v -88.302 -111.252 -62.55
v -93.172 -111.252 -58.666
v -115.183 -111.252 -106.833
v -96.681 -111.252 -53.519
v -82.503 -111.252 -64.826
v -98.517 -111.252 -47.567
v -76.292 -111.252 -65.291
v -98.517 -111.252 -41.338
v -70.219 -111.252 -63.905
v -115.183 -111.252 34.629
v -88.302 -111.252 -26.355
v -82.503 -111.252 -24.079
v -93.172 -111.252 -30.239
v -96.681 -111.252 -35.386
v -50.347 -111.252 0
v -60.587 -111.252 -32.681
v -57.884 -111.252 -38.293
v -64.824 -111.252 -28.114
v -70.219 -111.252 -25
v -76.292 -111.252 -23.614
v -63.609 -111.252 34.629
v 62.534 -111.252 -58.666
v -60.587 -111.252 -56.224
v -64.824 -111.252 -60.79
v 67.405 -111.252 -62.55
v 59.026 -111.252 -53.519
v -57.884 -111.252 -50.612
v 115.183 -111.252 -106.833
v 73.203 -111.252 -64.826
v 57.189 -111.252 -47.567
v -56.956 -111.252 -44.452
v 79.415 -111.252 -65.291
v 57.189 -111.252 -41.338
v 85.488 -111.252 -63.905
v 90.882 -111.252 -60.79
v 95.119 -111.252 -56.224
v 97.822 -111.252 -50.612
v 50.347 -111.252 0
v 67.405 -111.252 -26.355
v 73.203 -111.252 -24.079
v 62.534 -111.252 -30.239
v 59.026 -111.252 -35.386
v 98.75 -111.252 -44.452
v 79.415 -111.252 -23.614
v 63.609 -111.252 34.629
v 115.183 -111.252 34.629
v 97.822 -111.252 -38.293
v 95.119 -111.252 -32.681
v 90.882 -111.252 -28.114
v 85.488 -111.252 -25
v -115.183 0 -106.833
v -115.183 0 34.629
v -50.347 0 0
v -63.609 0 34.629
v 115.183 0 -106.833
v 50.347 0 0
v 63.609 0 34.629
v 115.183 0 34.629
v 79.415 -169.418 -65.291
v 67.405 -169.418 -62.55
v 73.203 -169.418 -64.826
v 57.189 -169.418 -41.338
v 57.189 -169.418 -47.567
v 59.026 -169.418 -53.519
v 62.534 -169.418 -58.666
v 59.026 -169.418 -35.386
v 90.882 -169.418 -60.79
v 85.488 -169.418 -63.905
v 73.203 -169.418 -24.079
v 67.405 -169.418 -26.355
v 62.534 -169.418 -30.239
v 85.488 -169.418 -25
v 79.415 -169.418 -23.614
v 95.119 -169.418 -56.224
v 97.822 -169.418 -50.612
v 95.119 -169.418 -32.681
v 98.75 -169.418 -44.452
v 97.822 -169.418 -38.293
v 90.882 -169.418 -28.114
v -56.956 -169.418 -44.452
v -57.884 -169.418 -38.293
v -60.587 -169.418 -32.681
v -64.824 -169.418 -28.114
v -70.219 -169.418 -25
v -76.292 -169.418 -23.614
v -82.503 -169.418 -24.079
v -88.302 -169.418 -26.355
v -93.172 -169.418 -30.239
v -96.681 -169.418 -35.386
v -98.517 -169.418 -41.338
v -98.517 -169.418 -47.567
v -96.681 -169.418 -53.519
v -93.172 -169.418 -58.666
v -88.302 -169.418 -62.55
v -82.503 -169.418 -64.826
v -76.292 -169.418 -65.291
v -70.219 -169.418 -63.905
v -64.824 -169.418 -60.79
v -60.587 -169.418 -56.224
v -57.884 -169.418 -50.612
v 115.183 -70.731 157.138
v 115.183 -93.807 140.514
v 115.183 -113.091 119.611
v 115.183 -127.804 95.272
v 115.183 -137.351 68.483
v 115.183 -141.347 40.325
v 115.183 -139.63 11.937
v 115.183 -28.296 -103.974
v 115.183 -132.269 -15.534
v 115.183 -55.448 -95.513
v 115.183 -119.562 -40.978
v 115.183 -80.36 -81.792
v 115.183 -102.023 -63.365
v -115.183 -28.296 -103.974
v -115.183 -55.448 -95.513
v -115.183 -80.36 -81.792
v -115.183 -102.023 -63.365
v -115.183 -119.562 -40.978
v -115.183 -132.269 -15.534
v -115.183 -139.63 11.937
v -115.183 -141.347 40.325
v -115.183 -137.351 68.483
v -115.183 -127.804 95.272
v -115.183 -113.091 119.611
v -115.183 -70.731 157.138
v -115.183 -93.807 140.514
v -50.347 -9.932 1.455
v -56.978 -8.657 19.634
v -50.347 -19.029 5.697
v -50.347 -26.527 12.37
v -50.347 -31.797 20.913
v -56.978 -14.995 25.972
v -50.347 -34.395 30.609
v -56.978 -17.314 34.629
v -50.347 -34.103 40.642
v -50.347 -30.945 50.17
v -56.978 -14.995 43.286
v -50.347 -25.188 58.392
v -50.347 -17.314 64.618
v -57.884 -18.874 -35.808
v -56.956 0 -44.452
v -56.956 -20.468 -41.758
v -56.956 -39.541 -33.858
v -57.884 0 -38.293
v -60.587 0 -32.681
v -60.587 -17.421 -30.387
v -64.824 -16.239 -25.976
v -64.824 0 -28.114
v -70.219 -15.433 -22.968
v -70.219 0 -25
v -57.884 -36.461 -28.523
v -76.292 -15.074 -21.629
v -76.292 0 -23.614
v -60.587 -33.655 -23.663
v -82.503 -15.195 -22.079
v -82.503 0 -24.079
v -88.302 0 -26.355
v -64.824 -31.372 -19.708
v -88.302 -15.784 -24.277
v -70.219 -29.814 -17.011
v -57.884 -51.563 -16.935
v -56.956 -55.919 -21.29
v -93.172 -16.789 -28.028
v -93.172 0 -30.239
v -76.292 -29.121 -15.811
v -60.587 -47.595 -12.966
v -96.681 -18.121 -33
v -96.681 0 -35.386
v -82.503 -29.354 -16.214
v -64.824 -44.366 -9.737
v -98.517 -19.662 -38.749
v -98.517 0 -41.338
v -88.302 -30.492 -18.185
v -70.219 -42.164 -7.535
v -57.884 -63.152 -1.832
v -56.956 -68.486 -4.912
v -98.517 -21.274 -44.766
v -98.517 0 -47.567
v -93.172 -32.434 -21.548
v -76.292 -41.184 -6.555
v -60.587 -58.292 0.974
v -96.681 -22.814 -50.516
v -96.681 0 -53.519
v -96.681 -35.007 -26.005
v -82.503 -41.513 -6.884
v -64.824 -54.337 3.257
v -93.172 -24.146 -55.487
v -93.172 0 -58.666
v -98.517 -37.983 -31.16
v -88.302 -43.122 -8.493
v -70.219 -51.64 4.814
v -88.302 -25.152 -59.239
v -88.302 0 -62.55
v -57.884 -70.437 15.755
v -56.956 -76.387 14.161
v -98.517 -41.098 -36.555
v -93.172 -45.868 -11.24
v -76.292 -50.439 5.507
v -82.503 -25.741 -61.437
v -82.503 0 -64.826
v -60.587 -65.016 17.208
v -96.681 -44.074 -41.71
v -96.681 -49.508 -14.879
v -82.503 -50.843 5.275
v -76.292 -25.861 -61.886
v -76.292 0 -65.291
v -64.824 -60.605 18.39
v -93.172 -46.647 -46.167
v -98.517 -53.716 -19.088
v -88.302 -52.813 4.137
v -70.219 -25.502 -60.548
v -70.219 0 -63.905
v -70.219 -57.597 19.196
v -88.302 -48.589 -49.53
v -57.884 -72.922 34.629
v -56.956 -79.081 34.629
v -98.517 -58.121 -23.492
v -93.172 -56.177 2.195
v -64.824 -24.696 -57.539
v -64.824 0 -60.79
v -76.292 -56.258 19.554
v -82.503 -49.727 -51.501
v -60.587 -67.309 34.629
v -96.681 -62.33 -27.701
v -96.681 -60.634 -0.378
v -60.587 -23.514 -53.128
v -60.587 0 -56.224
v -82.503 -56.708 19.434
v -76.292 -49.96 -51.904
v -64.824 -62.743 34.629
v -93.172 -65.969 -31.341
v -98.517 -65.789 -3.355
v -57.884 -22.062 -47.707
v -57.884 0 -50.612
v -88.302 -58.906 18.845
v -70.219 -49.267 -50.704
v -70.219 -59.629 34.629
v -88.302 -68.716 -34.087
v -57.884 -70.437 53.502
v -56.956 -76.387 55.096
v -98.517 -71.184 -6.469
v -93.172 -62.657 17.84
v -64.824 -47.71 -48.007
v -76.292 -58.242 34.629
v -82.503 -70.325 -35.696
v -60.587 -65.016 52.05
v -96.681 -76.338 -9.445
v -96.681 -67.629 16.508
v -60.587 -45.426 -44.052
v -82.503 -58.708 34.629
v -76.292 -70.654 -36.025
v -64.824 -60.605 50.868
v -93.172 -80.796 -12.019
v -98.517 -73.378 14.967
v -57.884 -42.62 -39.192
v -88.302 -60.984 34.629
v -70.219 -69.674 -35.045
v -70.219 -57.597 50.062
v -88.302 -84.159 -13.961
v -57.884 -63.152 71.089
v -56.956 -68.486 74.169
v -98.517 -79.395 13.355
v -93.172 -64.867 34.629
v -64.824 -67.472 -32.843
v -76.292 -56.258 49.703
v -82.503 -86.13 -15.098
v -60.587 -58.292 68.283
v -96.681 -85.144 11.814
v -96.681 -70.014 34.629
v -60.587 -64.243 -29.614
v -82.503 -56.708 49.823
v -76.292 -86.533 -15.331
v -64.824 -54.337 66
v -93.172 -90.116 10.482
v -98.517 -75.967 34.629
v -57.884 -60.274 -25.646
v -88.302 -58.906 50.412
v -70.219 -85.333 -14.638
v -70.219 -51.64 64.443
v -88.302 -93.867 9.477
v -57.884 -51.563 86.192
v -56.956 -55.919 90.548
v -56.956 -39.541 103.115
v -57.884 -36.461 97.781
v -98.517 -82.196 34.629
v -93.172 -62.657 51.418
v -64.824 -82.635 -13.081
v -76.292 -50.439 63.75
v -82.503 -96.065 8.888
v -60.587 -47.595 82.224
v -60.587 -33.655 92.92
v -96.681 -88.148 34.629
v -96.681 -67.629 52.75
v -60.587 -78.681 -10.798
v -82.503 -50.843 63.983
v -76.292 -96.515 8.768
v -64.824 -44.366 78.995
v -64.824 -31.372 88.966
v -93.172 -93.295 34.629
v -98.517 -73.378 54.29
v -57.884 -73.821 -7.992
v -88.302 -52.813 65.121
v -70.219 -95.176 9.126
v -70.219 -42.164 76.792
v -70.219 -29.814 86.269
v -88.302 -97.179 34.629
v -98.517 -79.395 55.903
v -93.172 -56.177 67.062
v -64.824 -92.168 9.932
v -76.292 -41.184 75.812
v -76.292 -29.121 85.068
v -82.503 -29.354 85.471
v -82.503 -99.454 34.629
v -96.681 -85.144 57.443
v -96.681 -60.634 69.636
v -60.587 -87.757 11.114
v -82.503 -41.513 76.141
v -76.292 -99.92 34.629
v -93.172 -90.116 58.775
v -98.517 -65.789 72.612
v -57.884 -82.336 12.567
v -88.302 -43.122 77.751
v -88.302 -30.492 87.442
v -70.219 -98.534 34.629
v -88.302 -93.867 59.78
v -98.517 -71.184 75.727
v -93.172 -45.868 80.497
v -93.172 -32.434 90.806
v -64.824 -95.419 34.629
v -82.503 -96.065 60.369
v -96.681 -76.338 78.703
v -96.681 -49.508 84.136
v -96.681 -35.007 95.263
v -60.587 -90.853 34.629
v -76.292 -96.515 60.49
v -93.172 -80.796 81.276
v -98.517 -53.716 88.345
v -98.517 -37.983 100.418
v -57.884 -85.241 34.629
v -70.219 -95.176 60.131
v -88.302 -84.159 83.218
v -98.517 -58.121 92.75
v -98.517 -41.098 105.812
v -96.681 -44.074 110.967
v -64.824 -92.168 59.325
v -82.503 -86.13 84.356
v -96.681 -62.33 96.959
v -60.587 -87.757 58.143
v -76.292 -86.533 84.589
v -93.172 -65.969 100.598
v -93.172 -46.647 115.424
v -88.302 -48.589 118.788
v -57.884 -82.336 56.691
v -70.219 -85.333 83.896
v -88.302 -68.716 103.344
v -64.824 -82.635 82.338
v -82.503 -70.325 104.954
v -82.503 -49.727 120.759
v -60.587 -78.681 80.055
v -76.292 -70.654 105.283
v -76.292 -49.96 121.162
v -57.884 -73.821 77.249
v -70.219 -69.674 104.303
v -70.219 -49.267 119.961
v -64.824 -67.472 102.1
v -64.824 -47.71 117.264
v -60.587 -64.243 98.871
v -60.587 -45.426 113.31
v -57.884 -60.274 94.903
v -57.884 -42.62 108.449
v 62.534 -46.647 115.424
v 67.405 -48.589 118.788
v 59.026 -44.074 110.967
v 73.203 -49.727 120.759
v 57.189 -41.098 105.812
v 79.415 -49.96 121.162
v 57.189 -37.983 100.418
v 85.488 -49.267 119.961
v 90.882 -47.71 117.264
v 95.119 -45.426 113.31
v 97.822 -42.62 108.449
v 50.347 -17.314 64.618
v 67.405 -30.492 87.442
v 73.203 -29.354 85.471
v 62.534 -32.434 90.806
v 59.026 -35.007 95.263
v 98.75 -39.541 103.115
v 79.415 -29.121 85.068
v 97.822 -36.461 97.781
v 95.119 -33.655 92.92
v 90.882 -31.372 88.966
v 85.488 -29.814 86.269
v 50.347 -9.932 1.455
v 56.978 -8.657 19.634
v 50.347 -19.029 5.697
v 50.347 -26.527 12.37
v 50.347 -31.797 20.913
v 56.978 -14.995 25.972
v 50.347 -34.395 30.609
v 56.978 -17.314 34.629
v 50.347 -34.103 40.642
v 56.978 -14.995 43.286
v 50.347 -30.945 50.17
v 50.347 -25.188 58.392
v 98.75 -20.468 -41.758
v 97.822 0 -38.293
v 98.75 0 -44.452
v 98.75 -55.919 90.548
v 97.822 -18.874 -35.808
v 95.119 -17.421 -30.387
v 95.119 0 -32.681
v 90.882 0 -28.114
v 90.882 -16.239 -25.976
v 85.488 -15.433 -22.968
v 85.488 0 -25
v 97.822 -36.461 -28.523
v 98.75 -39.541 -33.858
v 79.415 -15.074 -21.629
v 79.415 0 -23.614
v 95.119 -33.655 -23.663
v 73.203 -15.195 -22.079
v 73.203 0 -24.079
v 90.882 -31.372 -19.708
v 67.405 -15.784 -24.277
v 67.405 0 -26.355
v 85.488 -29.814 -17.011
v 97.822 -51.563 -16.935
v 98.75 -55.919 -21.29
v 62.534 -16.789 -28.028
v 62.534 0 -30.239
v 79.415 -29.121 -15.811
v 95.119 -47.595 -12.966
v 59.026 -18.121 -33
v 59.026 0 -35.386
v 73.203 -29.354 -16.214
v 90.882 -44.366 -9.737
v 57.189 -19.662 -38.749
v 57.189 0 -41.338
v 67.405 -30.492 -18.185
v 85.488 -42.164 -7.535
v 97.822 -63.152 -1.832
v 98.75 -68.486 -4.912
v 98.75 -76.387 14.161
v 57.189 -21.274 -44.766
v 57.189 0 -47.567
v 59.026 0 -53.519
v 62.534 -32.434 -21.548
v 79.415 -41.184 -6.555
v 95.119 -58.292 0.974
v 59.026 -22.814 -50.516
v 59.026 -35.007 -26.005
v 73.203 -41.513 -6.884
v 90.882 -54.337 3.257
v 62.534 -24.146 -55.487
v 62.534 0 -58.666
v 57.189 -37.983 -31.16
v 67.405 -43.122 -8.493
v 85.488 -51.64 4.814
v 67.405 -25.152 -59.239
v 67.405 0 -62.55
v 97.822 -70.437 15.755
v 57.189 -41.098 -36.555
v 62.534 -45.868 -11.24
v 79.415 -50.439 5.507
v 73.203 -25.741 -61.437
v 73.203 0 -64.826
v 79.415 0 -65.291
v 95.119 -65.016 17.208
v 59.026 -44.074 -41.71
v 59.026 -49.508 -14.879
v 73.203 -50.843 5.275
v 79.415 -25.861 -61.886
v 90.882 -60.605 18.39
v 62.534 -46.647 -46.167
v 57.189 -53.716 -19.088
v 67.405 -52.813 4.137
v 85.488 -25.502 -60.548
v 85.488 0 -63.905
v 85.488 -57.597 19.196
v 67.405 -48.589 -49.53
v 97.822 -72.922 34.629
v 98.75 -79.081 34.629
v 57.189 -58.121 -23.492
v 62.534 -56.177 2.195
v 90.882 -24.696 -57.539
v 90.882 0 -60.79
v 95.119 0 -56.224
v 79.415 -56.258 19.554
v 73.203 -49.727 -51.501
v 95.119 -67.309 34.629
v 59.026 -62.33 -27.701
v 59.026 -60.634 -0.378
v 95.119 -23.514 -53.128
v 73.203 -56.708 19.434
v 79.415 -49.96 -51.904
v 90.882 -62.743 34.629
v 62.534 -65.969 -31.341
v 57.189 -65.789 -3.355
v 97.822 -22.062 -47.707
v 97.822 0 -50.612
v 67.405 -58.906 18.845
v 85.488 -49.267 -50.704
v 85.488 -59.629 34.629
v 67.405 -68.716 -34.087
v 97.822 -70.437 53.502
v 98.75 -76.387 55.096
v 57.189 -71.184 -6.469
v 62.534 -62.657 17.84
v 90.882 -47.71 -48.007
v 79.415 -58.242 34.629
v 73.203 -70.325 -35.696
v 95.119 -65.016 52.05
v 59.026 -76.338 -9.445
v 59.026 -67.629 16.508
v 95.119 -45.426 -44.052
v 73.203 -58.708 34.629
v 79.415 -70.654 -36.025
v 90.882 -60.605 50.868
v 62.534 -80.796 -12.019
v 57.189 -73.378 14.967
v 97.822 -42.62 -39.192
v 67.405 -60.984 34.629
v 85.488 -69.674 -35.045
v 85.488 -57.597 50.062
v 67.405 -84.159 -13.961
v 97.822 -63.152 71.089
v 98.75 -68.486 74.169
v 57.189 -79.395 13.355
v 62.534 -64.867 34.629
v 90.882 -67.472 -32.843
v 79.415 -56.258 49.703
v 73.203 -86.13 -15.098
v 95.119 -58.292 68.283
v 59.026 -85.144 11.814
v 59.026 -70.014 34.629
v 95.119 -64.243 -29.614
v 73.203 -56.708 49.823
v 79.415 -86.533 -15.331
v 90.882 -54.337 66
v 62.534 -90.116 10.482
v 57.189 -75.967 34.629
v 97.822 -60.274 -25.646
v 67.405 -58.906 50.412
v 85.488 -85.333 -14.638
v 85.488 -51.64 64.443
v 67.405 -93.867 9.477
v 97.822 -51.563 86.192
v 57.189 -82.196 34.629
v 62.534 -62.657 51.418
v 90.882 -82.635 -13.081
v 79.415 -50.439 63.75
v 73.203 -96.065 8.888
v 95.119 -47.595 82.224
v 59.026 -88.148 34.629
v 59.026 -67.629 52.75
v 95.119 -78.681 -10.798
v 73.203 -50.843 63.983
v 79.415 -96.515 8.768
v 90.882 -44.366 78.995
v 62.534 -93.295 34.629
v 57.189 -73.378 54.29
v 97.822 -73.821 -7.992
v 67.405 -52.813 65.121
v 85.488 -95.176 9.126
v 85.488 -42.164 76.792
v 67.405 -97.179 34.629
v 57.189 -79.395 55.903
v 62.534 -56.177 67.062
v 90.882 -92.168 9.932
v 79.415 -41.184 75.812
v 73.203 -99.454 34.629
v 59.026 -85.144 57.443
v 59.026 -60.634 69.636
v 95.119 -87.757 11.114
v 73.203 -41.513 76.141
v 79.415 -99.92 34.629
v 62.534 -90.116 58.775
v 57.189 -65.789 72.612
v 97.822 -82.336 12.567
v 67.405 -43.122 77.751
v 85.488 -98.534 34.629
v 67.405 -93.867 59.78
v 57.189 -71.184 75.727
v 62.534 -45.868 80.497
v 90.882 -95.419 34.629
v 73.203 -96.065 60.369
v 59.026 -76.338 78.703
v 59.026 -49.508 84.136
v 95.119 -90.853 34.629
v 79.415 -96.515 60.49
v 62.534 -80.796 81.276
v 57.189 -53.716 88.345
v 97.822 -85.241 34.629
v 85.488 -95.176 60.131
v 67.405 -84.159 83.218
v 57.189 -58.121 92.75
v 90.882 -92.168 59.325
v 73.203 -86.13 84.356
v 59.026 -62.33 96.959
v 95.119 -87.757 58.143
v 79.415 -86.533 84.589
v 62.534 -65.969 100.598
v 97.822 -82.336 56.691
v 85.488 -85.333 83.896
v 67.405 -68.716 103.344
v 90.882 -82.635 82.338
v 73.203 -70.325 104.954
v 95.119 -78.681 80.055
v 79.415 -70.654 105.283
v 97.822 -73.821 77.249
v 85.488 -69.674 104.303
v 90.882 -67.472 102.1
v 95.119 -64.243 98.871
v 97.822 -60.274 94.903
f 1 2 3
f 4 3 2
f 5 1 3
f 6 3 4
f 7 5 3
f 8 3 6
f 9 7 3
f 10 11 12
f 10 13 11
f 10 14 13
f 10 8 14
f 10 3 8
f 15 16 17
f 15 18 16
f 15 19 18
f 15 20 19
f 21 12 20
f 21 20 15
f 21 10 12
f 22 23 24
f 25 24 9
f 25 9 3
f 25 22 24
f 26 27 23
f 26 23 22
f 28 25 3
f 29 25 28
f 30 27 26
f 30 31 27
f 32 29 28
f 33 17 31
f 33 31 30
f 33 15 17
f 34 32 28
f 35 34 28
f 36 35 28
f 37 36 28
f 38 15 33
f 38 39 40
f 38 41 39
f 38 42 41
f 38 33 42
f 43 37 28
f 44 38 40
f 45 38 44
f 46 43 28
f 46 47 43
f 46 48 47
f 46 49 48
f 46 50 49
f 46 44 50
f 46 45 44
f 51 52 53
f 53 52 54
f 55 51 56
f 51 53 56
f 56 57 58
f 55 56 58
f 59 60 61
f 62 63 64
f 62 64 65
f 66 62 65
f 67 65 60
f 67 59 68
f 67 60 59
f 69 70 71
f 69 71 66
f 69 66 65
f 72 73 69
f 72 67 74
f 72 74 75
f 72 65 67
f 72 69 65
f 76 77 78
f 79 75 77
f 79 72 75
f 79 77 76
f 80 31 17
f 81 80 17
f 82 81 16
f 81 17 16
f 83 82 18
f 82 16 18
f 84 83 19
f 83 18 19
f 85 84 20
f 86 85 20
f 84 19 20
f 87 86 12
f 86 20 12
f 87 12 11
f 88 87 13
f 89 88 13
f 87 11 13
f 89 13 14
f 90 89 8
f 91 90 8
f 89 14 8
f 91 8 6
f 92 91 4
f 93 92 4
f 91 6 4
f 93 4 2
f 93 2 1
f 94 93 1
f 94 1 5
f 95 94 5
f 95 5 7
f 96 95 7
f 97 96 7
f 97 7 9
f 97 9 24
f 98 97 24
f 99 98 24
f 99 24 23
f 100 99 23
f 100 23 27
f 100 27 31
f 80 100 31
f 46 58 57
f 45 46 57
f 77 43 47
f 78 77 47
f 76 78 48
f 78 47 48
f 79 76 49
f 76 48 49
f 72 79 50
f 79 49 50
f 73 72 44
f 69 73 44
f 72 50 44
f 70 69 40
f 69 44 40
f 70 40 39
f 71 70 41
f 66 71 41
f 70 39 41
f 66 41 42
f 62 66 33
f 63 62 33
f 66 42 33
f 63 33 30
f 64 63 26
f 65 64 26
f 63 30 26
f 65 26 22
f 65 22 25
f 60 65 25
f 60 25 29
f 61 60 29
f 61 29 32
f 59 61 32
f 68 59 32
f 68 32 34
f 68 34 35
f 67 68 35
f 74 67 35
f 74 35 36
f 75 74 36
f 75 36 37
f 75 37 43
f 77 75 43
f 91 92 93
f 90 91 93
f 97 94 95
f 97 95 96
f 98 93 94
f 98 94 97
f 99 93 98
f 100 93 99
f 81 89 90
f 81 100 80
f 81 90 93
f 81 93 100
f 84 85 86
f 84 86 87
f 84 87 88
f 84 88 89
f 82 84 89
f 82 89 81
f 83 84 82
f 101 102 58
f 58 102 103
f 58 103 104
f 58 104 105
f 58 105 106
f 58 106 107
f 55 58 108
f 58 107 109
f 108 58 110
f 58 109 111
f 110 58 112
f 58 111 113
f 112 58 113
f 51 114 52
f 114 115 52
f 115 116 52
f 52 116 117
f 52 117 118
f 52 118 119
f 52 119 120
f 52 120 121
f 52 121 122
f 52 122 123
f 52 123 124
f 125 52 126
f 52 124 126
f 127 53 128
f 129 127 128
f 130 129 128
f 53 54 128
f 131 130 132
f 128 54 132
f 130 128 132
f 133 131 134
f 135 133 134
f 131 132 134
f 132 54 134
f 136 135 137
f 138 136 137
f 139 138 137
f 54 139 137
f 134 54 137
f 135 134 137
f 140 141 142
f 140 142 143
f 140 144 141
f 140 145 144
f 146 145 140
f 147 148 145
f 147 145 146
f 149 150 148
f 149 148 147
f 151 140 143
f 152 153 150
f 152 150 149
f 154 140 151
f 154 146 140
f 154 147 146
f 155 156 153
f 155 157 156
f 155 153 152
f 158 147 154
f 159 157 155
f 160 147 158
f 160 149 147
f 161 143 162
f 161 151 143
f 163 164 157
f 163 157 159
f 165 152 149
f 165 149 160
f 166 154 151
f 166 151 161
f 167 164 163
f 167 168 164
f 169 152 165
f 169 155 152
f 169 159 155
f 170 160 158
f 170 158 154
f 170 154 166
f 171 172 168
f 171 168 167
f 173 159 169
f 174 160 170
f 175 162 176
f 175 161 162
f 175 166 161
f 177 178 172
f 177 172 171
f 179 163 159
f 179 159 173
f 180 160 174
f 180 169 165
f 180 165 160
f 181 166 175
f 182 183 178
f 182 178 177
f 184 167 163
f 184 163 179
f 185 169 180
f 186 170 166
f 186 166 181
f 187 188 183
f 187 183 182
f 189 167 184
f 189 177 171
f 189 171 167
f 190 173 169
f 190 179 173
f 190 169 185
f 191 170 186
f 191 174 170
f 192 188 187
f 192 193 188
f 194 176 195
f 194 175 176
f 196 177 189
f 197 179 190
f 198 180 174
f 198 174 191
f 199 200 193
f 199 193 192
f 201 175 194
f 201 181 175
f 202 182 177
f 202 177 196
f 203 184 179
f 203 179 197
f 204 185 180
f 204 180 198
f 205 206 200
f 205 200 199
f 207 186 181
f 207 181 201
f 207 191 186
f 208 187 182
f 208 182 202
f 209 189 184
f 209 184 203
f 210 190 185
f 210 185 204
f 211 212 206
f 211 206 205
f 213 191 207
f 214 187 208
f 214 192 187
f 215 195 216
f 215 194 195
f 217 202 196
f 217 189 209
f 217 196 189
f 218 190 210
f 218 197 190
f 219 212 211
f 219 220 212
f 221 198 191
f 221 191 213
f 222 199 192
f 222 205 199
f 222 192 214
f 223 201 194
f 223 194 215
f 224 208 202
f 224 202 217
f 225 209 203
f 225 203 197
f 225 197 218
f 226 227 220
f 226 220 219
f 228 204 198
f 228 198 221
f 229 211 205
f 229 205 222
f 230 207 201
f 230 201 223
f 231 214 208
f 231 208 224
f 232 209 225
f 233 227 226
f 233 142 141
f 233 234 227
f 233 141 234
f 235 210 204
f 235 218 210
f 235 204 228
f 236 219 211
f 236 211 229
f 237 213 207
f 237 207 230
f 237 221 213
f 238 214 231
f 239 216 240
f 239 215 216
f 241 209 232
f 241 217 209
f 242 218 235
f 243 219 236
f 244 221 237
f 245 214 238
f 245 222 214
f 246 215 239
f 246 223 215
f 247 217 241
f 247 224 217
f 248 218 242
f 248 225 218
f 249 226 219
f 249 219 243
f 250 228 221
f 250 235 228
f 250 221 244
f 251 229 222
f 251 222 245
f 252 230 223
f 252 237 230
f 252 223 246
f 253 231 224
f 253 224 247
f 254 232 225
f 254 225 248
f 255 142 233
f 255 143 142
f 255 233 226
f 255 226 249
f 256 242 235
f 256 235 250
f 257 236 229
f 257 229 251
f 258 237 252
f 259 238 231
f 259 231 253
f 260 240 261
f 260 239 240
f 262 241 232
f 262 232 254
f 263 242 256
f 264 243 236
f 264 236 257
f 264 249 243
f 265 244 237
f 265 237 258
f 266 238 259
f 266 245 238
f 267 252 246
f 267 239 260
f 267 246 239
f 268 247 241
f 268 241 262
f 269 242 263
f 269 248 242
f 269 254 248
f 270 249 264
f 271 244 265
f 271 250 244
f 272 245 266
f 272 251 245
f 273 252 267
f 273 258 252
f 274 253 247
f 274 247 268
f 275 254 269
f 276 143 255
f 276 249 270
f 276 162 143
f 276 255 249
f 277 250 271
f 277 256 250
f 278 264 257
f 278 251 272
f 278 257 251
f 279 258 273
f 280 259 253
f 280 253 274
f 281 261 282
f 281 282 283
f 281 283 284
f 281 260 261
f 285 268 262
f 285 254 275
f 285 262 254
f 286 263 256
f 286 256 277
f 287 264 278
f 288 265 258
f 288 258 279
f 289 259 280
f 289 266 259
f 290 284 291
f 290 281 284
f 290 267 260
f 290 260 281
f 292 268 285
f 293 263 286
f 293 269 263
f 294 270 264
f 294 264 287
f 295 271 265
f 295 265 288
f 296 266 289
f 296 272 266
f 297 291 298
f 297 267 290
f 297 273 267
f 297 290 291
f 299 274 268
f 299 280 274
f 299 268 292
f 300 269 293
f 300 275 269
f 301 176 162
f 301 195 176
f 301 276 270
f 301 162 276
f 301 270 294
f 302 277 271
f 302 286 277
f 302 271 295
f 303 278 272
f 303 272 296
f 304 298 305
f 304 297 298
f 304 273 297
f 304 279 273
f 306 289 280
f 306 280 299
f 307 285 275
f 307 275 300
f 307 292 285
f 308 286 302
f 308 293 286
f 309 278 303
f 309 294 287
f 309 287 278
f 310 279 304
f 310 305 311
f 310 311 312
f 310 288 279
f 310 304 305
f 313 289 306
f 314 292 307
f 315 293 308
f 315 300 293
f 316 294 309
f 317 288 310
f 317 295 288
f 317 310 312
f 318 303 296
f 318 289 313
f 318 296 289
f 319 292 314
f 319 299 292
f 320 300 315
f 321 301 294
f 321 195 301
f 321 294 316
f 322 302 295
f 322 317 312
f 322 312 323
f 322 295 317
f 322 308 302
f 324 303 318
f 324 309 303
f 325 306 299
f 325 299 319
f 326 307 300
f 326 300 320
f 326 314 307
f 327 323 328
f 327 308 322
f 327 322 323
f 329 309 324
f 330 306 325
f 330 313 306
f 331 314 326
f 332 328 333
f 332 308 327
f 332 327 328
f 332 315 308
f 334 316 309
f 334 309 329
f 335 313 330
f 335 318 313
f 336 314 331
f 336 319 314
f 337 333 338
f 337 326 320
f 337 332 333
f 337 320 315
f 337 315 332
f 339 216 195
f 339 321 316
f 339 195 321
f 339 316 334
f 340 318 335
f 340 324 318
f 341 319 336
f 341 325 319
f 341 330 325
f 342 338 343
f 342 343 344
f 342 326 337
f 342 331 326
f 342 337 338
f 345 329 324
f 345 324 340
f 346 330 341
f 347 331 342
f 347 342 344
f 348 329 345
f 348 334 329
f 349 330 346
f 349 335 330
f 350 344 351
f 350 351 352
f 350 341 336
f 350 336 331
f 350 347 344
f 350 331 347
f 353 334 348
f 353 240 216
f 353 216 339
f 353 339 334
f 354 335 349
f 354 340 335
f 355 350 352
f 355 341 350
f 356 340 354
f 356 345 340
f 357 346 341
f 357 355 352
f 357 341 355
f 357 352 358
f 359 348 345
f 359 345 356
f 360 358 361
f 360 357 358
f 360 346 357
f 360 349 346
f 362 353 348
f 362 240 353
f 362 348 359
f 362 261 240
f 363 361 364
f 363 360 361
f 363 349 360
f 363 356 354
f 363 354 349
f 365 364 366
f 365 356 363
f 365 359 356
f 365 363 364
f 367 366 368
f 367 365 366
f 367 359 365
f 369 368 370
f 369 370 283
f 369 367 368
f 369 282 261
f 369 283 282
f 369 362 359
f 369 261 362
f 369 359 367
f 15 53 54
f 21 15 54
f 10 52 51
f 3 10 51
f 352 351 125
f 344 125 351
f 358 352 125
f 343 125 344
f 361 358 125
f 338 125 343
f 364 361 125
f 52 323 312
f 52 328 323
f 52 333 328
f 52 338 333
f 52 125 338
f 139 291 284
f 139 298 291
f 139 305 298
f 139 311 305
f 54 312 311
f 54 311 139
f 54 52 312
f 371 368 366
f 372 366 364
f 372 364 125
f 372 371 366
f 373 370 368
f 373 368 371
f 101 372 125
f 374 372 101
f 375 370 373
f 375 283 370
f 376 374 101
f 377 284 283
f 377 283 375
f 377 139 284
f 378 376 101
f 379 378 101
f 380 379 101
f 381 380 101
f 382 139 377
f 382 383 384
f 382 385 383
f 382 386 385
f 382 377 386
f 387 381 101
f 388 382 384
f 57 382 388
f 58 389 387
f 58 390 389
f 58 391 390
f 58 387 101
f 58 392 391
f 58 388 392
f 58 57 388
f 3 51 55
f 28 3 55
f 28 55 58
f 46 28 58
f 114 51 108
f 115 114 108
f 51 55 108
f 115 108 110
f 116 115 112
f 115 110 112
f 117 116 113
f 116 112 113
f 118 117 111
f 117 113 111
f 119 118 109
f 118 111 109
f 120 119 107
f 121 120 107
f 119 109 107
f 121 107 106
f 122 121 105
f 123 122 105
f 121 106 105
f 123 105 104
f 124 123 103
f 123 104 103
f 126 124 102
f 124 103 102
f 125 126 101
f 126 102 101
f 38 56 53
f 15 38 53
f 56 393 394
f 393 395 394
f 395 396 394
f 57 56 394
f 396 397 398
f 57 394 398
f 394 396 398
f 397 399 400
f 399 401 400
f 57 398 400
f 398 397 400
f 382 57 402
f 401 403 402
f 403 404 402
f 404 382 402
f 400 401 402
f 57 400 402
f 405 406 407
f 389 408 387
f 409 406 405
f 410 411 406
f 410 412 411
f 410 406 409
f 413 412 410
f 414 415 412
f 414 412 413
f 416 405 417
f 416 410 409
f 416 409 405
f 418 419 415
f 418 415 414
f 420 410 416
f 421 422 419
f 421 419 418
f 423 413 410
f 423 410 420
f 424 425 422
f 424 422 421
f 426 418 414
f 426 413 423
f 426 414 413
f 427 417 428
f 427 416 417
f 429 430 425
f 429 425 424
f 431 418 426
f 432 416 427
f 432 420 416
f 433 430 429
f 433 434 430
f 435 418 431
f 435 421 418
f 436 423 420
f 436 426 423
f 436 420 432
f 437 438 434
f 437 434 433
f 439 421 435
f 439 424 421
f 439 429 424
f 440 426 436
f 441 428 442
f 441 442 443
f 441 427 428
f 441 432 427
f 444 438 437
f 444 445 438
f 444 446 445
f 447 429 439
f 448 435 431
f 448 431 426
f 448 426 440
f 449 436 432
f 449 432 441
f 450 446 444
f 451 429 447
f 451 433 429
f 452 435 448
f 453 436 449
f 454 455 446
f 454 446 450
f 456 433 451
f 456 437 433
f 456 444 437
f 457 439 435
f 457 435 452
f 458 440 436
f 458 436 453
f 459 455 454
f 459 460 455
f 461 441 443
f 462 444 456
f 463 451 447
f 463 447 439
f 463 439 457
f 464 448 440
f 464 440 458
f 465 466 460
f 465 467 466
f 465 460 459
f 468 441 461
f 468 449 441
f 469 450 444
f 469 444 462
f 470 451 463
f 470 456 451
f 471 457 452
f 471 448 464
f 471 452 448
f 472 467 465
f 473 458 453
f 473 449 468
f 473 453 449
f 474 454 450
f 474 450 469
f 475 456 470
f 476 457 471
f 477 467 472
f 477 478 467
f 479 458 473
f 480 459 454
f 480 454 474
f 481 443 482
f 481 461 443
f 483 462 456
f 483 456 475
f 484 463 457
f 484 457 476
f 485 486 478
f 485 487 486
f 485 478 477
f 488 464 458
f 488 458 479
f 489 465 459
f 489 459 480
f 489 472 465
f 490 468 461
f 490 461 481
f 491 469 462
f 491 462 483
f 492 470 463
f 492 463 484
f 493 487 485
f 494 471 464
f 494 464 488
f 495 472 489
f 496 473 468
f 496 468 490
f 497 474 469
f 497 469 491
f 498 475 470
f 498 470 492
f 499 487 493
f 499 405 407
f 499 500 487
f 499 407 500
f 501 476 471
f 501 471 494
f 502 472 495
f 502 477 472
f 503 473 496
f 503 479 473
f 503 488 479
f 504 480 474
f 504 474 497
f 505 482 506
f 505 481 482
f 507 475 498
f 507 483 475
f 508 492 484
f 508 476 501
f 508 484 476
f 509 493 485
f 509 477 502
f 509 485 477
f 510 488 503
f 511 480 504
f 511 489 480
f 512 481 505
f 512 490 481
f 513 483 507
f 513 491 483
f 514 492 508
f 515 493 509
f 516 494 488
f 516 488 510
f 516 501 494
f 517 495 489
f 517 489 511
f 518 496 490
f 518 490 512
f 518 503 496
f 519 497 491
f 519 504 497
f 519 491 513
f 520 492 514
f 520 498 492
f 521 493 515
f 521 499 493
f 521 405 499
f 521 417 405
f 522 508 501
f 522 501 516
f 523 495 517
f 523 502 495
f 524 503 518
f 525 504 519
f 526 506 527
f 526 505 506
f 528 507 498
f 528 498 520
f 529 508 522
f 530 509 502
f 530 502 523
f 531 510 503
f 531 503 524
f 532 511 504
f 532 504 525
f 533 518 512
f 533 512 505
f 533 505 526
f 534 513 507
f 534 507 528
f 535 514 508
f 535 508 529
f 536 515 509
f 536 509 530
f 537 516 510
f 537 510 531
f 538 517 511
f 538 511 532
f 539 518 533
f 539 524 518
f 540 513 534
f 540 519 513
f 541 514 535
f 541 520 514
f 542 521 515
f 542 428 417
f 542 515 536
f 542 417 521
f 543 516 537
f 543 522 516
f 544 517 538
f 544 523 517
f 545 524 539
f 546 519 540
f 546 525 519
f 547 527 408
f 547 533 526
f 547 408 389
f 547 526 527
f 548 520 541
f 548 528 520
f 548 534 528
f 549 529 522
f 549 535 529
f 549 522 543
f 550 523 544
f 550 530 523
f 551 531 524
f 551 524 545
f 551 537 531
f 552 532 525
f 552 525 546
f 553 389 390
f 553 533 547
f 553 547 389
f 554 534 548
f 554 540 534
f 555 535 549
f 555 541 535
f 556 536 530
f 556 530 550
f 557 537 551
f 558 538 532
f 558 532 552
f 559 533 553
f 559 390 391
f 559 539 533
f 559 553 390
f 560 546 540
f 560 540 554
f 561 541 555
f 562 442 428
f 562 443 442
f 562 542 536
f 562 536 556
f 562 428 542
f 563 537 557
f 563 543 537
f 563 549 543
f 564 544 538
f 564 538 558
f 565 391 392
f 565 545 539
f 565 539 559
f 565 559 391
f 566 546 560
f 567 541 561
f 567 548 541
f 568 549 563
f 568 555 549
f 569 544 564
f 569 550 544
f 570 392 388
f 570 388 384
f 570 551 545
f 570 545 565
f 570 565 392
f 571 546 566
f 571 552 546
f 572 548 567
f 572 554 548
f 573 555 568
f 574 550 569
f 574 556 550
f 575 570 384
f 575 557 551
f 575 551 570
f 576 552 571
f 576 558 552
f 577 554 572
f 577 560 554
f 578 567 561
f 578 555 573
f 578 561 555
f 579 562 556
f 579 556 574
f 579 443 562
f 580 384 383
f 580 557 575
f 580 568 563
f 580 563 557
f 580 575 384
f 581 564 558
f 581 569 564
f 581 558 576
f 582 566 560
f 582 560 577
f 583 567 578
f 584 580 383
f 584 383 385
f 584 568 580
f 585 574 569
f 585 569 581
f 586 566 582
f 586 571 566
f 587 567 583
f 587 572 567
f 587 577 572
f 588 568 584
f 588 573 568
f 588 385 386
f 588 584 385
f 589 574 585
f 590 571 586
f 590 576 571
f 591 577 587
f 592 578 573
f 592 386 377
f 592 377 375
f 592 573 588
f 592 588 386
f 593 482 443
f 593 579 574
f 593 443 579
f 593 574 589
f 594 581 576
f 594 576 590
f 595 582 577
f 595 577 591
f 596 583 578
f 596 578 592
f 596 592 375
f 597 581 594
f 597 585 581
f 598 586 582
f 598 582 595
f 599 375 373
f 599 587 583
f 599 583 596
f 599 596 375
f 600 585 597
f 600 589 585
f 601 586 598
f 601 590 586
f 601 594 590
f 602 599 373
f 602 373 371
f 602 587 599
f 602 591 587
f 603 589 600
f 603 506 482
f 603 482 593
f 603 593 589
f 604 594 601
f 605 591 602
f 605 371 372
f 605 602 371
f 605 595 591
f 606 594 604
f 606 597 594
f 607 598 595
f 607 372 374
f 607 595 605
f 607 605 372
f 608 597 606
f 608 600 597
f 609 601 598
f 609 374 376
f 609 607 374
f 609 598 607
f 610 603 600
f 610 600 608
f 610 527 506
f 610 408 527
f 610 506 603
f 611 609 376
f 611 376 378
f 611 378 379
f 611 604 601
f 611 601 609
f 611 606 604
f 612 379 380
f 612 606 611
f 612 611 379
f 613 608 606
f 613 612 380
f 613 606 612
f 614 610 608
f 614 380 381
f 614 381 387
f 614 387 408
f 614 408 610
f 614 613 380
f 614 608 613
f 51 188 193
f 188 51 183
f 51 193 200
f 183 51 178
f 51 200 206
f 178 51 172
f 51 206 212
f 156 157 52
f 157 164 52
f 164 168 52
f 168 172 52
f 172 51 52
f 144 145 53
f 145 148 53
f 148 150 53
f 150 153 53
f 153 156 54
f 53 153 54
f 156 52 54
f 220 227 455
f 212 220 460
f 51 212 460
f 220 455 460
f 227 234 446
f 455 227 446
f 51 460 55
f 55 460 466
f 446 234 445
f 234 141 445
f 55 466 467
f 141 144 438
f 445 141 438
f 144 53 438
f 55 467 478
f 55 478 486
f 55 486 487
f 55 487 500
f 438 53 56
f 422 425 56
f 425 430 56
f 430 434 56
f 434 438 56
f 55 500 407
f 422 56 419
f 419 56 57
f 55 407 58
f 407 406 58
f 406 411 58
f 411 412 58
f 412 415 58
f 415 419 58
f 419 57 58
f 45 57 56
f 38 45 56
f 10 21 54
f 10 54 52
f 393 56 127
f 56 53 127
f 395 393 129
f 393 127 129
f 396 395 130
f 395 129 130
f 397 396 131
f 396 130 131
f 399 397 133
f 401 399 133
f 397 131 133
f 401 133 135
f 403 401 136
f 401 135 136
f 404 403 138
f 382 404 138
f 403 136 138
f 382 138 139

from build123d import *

# Parameters (mm, degrees)
F0_R     = 20.897114
F1_DEPTH = 111.252
F2_DEPTH = 169.418
F3_ANGLE = -150


with BuildPart() as f1:
    # F0 (on Front) → F1 (new body)
    with BuildSketch(Plane.XZ):
        Polygon((50.346687, 0), (0, 0), (-50.346687, 0), (-63.608736, 34.628697), (-115.183398, 34.628697), (-115.183398, 0), (-115.183398, -106.833205), (0, -106.833205), (115.183398, -106.833205), (115.183398, 0), (115.183398, 34.628697), (63.608736, 34.628697), align=None)
        with Locations((-77.853166, -44.45244)):
            Circle(F0_R, mode=Mode.SUBTRACT)
        with Locations((77.853166, -44.45244)):
            Circle(F0_R, mode=Mode.SUBTRACT)
    extrude(amount=F1_DEPTH)

    # F0 (on Front) → F2 (join)
    with BuildSketch(Plane.XZ):
        with Locations((77.853166, -44.45244)):
            Circle(F0_R)
        with Locations((-77.853166, -44.45244)):
            Circle(F0_R)
    extrude(amount=F2_DEPTH)


with BuildPart() as f3:
    # F0 (on Front) → F3 (revolve)
    with BuildSketch(Plane.XZ):
        Polygon((50.346687, 0), (0, 0), (-50.346687, 0), (-63.608736, 34.628697), (-115.183398, 34.628697), (-115.183398, 0), (-115.183398, -106.833205), (0, -106.833205), (115.183398, -106.833205), (115.183398, 0), (115.183398, 34.628697), (63.608736, 34.628697), align=None)
        with Locations((-77.853166, -44.45244)):
            Circle(F0_R, mode=Mode.SUBTRACT)
        with Locations((77.853166, -44.45244)):
            Circle(F0_R, mode=Mode.SUBTRACT)
    revolve(axis=Axis((89.396067, 0, 34.628697), (1, 0, 0)), revolution_arc=F3_ANGLE)


solid = Compound([f1.part, f3.part])
